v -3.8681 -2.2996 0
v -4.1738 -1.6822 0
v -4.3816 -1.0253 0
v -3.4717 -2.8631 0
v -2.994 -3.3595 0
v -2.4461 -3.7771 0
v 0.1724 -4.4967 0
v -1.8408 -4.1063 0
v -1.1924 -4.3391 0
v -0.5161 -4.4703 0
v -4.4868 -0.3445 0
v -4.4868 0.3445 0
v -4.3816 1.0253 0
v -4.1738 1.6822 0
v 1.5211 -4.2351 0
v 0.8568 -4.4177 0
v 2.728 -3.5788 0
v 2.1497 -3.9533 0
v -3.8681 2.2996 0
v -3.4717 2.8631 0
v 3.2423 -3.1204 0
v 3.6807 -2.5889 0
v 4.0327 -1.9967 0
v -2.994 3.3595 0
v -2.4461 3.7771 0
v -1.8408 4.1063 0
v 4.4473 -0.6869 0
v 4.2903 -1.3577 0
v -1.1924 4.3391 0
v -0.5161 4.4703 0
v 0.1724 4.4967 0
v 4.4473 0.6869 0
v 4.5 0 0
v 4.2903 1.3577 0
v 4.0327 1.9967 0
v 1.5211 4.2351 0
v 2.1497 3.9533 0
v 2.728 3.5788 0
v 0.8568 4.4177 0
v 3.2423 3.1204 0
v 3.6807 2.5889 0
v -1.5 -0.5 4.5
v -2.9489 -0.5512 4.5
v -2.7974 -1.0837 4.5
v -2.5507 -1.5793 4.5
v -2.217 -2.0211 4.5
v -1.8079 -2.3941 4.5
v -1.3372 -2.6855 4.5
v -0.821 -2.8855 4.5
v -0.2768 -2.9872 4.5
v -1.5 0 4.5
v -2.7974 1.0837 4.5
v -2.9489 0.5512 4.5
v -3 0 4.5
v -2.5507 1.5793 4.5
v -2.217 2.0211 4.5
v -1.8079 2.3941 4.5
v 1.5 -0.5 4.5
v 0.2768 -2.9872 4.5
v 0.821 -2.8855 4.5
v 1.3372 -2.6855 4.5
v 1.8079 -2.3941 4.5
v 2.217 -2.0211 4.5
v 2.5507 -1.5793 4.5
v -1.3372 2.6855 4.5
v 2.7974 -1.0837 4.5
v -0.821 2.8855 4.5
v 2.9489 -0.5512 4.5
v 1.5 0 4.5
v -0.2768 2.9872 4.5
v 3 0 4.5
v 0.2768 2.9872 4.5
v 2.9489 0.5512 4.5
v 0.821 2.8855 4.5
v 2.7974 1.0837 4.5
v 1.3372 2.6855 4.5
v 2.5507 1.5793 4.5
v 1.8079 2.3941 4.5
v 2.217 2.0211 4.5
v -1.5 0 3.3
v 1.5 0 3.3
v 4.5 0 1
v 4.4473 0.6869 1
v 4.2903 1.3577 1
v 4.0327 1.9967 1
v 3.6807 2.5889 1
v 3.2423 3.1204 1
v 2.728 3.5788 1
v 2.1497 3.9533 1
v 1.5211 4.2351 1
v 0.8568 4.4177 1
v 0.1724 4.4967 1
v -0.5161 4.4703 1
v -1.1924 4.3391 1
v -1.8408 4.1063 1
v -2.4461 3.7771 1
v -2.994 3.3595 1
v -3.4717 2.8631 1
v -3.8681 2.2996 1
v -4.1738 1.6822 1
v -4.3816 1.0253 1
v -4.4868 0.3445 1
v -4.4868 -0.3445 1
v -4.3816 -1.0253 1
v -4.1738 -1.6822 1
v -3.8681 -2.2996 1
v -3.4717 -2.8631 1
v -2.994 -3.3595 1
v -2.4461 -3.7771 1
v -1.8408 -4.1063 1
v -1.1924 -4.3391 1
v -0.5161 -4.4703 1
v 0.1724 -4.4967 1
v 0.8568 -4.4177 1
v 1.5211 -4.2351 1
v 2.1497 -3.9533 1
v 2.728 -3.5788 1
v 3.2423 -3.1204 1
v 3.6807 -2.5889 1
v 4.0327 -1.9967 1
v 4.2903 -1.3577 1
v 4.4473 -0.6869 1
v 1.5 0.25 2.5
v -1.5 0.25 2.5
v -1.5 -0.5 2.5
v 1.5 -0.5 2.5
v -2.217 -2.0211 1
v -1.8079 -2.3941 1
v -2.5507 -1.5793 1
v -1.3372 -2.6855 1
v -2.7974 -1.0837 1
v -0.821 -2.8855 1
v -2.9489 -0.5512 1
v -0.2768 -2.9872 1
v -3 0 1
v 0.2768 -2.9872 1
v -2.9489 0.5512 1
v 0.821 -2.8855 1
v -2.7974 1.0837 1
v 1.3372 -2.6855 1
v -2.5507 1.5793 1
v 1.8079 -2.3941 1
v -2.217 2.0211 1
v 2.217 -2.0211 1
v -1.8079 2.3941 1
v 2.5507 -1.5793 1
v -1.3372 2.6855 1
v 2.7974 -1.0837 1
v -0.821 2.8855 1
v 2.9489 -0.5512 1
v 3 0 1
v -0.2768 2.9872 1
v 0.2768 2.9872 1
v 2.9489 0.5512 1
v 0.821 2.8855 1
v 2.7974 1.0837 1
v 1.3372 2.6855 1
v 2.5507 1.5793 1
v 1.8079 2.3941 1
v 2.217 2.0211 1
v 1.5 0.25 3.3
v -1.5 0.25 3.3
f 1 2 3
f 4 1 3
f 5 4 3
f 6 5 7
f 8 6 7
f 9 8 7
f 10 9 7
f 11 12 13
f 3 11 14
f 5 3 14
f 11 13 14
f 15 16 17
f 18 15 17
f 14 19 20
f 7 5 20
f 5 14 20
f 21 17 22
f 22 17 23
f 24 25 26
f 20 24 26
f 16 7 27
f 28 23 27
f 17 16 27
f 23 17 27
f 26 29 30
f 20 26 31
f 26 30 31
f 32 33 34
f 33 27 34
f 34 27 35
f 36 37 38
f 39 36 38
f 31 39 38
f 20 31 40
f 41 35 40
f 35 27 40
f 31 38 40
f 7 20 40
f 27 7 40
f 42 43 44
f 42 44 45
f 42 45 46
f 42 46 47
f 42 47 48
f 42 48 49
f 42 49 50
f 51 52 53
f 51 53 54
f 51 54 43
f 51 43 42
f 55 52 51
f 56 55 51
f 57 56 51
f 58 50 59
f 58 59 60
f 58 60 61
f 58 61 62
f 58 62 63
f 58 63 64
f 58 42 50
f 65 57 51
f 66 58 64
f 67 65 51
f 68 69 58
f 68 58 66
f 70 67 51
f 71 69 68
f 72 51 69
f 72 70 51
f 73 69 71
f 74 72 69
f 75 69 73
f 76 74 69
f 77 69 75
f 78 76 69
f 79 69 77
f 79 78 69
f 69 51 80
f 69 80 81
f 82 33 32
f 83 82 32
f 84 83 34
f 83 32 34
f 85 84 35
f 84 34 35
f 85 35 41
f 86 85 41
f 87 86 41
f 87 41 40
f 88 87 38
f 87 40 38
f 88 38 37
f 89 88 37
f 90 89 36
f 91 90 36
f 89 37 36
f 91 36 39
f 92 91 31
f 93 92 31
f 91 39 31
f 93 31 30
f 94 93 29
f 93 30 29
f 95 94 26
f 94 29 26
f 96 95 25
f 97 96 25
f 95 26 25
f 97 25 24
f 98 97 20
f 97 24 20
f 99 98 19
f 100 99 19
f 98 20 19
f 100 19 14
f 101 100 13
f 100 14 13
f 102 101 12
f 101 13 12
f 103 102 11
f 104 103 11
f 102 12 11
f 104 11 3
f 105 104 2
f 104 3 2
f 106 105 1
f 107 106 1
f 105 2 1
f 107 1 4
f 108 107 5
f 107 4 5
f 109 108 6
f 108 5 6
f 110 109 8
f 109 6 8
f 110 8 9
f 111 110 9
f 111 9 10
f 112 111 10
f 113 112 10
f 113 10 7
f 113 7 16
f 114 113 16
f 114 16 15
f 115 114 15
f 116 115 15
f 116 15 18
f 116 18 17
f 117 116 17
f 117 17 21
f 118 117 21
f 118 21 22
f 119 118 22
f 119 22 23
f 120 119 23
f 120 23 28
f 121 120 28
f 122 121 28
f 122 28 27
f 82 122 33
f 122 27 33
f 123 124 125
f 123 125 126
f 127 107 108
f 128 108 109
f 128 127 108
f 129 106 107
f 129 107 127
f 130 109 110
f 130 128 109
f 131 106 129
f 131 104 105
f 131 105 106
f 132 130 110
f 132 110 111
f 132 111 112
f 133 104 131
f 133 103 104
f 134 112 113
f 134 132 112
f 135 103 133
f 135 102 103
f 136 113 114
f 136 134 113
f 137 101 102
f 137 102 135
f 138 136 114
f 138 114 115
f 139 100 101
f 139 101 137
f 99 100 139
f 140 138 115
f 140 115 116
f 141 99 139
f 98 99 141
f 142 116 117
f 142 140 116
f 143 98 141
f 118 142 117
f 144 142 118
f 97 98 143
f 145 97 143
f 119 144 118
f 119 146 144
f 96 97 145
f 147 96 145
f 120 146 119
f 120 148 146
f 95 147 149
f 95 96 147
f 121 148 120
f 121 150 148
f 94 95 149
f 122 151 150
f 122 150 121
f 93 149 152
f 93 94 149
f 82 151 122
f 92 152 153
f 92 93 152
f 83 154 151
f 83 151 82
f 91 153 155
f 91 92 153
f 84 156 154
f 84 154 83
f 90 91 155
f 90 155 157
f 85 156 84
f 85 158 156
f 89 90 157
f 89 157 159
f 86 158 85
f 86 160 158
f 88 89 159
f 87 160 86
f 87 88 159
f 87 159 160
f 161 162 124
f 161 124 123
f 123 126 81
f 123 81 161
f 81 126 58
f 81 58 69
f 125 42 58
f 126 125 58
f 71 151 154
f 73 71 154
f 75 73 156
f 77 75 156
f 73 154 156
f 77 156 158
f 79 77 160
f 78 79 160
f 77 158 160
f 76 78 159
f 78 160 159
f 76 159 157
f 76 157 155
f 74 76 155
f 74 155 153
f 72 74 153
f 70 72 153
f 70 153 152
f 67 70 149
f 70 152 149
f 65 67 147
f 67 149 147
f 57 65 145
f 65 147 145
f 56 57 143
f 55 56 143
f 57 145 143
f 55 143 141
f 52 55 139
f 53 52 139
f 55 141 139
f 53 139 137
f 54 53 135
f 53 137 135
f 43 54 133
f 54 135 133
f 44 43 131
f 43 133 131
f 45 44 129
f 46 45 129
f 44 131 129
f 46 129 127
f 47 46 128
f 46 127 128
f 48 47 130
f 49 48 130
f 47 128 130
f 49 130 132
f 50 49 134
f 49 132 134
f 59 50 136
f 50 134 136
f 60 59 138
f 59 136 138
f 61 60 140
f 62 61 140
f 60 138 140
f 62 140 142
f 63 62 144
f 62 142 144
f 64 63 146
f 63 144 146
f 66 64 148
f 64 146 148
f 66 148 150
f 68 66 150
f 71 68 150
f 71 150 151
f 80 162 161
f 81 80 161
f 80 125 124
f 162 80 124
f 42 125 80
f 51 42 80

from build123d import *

# Parameters (mm, degrees)
F0_R     = 4.5
F1_DEPTH = 1
F2_R     = 3
F3_DEPTH = 3.5
F4_W     = 3
F4_H     = 0.75
F5_DEPTH = 2
F6_W     = 3
F6_H     = 0.25
F7_DEPTH = 1.2


with BuildPart() as f1:
    # F0 (on Top) → F1 (new body)
    with BuildSketch(Plane.XY):
        Circle(F0_R)
    extrude(amount=F1_DEPTH)

    # F2 (on face) → F3 (join)
    with BuildSketch(Plane.XY.offset(1)):
        Circle(F2_R)
    extrude(amount=F3_DEPTH)

    # F4 (on face) → F5 (cut)
    with BuildSketch(Plane.XY.offset(4.5)):
        with Locations((0, -0.125)):
            Rectangle(F4_W, F4_H)
    extrude(amount=-F5_DEPTH, mode=Mode.SUBTRACT)

    # F6 (on face) → F7 (join)
    with BuildSketch(Plane.XY.offset(4.5)):
        with Locations((0, 0.125)):
            Rectangle(F6_W, F6_H)
    extrude(amount=-F7_DEPTH)


solid = f1.part
